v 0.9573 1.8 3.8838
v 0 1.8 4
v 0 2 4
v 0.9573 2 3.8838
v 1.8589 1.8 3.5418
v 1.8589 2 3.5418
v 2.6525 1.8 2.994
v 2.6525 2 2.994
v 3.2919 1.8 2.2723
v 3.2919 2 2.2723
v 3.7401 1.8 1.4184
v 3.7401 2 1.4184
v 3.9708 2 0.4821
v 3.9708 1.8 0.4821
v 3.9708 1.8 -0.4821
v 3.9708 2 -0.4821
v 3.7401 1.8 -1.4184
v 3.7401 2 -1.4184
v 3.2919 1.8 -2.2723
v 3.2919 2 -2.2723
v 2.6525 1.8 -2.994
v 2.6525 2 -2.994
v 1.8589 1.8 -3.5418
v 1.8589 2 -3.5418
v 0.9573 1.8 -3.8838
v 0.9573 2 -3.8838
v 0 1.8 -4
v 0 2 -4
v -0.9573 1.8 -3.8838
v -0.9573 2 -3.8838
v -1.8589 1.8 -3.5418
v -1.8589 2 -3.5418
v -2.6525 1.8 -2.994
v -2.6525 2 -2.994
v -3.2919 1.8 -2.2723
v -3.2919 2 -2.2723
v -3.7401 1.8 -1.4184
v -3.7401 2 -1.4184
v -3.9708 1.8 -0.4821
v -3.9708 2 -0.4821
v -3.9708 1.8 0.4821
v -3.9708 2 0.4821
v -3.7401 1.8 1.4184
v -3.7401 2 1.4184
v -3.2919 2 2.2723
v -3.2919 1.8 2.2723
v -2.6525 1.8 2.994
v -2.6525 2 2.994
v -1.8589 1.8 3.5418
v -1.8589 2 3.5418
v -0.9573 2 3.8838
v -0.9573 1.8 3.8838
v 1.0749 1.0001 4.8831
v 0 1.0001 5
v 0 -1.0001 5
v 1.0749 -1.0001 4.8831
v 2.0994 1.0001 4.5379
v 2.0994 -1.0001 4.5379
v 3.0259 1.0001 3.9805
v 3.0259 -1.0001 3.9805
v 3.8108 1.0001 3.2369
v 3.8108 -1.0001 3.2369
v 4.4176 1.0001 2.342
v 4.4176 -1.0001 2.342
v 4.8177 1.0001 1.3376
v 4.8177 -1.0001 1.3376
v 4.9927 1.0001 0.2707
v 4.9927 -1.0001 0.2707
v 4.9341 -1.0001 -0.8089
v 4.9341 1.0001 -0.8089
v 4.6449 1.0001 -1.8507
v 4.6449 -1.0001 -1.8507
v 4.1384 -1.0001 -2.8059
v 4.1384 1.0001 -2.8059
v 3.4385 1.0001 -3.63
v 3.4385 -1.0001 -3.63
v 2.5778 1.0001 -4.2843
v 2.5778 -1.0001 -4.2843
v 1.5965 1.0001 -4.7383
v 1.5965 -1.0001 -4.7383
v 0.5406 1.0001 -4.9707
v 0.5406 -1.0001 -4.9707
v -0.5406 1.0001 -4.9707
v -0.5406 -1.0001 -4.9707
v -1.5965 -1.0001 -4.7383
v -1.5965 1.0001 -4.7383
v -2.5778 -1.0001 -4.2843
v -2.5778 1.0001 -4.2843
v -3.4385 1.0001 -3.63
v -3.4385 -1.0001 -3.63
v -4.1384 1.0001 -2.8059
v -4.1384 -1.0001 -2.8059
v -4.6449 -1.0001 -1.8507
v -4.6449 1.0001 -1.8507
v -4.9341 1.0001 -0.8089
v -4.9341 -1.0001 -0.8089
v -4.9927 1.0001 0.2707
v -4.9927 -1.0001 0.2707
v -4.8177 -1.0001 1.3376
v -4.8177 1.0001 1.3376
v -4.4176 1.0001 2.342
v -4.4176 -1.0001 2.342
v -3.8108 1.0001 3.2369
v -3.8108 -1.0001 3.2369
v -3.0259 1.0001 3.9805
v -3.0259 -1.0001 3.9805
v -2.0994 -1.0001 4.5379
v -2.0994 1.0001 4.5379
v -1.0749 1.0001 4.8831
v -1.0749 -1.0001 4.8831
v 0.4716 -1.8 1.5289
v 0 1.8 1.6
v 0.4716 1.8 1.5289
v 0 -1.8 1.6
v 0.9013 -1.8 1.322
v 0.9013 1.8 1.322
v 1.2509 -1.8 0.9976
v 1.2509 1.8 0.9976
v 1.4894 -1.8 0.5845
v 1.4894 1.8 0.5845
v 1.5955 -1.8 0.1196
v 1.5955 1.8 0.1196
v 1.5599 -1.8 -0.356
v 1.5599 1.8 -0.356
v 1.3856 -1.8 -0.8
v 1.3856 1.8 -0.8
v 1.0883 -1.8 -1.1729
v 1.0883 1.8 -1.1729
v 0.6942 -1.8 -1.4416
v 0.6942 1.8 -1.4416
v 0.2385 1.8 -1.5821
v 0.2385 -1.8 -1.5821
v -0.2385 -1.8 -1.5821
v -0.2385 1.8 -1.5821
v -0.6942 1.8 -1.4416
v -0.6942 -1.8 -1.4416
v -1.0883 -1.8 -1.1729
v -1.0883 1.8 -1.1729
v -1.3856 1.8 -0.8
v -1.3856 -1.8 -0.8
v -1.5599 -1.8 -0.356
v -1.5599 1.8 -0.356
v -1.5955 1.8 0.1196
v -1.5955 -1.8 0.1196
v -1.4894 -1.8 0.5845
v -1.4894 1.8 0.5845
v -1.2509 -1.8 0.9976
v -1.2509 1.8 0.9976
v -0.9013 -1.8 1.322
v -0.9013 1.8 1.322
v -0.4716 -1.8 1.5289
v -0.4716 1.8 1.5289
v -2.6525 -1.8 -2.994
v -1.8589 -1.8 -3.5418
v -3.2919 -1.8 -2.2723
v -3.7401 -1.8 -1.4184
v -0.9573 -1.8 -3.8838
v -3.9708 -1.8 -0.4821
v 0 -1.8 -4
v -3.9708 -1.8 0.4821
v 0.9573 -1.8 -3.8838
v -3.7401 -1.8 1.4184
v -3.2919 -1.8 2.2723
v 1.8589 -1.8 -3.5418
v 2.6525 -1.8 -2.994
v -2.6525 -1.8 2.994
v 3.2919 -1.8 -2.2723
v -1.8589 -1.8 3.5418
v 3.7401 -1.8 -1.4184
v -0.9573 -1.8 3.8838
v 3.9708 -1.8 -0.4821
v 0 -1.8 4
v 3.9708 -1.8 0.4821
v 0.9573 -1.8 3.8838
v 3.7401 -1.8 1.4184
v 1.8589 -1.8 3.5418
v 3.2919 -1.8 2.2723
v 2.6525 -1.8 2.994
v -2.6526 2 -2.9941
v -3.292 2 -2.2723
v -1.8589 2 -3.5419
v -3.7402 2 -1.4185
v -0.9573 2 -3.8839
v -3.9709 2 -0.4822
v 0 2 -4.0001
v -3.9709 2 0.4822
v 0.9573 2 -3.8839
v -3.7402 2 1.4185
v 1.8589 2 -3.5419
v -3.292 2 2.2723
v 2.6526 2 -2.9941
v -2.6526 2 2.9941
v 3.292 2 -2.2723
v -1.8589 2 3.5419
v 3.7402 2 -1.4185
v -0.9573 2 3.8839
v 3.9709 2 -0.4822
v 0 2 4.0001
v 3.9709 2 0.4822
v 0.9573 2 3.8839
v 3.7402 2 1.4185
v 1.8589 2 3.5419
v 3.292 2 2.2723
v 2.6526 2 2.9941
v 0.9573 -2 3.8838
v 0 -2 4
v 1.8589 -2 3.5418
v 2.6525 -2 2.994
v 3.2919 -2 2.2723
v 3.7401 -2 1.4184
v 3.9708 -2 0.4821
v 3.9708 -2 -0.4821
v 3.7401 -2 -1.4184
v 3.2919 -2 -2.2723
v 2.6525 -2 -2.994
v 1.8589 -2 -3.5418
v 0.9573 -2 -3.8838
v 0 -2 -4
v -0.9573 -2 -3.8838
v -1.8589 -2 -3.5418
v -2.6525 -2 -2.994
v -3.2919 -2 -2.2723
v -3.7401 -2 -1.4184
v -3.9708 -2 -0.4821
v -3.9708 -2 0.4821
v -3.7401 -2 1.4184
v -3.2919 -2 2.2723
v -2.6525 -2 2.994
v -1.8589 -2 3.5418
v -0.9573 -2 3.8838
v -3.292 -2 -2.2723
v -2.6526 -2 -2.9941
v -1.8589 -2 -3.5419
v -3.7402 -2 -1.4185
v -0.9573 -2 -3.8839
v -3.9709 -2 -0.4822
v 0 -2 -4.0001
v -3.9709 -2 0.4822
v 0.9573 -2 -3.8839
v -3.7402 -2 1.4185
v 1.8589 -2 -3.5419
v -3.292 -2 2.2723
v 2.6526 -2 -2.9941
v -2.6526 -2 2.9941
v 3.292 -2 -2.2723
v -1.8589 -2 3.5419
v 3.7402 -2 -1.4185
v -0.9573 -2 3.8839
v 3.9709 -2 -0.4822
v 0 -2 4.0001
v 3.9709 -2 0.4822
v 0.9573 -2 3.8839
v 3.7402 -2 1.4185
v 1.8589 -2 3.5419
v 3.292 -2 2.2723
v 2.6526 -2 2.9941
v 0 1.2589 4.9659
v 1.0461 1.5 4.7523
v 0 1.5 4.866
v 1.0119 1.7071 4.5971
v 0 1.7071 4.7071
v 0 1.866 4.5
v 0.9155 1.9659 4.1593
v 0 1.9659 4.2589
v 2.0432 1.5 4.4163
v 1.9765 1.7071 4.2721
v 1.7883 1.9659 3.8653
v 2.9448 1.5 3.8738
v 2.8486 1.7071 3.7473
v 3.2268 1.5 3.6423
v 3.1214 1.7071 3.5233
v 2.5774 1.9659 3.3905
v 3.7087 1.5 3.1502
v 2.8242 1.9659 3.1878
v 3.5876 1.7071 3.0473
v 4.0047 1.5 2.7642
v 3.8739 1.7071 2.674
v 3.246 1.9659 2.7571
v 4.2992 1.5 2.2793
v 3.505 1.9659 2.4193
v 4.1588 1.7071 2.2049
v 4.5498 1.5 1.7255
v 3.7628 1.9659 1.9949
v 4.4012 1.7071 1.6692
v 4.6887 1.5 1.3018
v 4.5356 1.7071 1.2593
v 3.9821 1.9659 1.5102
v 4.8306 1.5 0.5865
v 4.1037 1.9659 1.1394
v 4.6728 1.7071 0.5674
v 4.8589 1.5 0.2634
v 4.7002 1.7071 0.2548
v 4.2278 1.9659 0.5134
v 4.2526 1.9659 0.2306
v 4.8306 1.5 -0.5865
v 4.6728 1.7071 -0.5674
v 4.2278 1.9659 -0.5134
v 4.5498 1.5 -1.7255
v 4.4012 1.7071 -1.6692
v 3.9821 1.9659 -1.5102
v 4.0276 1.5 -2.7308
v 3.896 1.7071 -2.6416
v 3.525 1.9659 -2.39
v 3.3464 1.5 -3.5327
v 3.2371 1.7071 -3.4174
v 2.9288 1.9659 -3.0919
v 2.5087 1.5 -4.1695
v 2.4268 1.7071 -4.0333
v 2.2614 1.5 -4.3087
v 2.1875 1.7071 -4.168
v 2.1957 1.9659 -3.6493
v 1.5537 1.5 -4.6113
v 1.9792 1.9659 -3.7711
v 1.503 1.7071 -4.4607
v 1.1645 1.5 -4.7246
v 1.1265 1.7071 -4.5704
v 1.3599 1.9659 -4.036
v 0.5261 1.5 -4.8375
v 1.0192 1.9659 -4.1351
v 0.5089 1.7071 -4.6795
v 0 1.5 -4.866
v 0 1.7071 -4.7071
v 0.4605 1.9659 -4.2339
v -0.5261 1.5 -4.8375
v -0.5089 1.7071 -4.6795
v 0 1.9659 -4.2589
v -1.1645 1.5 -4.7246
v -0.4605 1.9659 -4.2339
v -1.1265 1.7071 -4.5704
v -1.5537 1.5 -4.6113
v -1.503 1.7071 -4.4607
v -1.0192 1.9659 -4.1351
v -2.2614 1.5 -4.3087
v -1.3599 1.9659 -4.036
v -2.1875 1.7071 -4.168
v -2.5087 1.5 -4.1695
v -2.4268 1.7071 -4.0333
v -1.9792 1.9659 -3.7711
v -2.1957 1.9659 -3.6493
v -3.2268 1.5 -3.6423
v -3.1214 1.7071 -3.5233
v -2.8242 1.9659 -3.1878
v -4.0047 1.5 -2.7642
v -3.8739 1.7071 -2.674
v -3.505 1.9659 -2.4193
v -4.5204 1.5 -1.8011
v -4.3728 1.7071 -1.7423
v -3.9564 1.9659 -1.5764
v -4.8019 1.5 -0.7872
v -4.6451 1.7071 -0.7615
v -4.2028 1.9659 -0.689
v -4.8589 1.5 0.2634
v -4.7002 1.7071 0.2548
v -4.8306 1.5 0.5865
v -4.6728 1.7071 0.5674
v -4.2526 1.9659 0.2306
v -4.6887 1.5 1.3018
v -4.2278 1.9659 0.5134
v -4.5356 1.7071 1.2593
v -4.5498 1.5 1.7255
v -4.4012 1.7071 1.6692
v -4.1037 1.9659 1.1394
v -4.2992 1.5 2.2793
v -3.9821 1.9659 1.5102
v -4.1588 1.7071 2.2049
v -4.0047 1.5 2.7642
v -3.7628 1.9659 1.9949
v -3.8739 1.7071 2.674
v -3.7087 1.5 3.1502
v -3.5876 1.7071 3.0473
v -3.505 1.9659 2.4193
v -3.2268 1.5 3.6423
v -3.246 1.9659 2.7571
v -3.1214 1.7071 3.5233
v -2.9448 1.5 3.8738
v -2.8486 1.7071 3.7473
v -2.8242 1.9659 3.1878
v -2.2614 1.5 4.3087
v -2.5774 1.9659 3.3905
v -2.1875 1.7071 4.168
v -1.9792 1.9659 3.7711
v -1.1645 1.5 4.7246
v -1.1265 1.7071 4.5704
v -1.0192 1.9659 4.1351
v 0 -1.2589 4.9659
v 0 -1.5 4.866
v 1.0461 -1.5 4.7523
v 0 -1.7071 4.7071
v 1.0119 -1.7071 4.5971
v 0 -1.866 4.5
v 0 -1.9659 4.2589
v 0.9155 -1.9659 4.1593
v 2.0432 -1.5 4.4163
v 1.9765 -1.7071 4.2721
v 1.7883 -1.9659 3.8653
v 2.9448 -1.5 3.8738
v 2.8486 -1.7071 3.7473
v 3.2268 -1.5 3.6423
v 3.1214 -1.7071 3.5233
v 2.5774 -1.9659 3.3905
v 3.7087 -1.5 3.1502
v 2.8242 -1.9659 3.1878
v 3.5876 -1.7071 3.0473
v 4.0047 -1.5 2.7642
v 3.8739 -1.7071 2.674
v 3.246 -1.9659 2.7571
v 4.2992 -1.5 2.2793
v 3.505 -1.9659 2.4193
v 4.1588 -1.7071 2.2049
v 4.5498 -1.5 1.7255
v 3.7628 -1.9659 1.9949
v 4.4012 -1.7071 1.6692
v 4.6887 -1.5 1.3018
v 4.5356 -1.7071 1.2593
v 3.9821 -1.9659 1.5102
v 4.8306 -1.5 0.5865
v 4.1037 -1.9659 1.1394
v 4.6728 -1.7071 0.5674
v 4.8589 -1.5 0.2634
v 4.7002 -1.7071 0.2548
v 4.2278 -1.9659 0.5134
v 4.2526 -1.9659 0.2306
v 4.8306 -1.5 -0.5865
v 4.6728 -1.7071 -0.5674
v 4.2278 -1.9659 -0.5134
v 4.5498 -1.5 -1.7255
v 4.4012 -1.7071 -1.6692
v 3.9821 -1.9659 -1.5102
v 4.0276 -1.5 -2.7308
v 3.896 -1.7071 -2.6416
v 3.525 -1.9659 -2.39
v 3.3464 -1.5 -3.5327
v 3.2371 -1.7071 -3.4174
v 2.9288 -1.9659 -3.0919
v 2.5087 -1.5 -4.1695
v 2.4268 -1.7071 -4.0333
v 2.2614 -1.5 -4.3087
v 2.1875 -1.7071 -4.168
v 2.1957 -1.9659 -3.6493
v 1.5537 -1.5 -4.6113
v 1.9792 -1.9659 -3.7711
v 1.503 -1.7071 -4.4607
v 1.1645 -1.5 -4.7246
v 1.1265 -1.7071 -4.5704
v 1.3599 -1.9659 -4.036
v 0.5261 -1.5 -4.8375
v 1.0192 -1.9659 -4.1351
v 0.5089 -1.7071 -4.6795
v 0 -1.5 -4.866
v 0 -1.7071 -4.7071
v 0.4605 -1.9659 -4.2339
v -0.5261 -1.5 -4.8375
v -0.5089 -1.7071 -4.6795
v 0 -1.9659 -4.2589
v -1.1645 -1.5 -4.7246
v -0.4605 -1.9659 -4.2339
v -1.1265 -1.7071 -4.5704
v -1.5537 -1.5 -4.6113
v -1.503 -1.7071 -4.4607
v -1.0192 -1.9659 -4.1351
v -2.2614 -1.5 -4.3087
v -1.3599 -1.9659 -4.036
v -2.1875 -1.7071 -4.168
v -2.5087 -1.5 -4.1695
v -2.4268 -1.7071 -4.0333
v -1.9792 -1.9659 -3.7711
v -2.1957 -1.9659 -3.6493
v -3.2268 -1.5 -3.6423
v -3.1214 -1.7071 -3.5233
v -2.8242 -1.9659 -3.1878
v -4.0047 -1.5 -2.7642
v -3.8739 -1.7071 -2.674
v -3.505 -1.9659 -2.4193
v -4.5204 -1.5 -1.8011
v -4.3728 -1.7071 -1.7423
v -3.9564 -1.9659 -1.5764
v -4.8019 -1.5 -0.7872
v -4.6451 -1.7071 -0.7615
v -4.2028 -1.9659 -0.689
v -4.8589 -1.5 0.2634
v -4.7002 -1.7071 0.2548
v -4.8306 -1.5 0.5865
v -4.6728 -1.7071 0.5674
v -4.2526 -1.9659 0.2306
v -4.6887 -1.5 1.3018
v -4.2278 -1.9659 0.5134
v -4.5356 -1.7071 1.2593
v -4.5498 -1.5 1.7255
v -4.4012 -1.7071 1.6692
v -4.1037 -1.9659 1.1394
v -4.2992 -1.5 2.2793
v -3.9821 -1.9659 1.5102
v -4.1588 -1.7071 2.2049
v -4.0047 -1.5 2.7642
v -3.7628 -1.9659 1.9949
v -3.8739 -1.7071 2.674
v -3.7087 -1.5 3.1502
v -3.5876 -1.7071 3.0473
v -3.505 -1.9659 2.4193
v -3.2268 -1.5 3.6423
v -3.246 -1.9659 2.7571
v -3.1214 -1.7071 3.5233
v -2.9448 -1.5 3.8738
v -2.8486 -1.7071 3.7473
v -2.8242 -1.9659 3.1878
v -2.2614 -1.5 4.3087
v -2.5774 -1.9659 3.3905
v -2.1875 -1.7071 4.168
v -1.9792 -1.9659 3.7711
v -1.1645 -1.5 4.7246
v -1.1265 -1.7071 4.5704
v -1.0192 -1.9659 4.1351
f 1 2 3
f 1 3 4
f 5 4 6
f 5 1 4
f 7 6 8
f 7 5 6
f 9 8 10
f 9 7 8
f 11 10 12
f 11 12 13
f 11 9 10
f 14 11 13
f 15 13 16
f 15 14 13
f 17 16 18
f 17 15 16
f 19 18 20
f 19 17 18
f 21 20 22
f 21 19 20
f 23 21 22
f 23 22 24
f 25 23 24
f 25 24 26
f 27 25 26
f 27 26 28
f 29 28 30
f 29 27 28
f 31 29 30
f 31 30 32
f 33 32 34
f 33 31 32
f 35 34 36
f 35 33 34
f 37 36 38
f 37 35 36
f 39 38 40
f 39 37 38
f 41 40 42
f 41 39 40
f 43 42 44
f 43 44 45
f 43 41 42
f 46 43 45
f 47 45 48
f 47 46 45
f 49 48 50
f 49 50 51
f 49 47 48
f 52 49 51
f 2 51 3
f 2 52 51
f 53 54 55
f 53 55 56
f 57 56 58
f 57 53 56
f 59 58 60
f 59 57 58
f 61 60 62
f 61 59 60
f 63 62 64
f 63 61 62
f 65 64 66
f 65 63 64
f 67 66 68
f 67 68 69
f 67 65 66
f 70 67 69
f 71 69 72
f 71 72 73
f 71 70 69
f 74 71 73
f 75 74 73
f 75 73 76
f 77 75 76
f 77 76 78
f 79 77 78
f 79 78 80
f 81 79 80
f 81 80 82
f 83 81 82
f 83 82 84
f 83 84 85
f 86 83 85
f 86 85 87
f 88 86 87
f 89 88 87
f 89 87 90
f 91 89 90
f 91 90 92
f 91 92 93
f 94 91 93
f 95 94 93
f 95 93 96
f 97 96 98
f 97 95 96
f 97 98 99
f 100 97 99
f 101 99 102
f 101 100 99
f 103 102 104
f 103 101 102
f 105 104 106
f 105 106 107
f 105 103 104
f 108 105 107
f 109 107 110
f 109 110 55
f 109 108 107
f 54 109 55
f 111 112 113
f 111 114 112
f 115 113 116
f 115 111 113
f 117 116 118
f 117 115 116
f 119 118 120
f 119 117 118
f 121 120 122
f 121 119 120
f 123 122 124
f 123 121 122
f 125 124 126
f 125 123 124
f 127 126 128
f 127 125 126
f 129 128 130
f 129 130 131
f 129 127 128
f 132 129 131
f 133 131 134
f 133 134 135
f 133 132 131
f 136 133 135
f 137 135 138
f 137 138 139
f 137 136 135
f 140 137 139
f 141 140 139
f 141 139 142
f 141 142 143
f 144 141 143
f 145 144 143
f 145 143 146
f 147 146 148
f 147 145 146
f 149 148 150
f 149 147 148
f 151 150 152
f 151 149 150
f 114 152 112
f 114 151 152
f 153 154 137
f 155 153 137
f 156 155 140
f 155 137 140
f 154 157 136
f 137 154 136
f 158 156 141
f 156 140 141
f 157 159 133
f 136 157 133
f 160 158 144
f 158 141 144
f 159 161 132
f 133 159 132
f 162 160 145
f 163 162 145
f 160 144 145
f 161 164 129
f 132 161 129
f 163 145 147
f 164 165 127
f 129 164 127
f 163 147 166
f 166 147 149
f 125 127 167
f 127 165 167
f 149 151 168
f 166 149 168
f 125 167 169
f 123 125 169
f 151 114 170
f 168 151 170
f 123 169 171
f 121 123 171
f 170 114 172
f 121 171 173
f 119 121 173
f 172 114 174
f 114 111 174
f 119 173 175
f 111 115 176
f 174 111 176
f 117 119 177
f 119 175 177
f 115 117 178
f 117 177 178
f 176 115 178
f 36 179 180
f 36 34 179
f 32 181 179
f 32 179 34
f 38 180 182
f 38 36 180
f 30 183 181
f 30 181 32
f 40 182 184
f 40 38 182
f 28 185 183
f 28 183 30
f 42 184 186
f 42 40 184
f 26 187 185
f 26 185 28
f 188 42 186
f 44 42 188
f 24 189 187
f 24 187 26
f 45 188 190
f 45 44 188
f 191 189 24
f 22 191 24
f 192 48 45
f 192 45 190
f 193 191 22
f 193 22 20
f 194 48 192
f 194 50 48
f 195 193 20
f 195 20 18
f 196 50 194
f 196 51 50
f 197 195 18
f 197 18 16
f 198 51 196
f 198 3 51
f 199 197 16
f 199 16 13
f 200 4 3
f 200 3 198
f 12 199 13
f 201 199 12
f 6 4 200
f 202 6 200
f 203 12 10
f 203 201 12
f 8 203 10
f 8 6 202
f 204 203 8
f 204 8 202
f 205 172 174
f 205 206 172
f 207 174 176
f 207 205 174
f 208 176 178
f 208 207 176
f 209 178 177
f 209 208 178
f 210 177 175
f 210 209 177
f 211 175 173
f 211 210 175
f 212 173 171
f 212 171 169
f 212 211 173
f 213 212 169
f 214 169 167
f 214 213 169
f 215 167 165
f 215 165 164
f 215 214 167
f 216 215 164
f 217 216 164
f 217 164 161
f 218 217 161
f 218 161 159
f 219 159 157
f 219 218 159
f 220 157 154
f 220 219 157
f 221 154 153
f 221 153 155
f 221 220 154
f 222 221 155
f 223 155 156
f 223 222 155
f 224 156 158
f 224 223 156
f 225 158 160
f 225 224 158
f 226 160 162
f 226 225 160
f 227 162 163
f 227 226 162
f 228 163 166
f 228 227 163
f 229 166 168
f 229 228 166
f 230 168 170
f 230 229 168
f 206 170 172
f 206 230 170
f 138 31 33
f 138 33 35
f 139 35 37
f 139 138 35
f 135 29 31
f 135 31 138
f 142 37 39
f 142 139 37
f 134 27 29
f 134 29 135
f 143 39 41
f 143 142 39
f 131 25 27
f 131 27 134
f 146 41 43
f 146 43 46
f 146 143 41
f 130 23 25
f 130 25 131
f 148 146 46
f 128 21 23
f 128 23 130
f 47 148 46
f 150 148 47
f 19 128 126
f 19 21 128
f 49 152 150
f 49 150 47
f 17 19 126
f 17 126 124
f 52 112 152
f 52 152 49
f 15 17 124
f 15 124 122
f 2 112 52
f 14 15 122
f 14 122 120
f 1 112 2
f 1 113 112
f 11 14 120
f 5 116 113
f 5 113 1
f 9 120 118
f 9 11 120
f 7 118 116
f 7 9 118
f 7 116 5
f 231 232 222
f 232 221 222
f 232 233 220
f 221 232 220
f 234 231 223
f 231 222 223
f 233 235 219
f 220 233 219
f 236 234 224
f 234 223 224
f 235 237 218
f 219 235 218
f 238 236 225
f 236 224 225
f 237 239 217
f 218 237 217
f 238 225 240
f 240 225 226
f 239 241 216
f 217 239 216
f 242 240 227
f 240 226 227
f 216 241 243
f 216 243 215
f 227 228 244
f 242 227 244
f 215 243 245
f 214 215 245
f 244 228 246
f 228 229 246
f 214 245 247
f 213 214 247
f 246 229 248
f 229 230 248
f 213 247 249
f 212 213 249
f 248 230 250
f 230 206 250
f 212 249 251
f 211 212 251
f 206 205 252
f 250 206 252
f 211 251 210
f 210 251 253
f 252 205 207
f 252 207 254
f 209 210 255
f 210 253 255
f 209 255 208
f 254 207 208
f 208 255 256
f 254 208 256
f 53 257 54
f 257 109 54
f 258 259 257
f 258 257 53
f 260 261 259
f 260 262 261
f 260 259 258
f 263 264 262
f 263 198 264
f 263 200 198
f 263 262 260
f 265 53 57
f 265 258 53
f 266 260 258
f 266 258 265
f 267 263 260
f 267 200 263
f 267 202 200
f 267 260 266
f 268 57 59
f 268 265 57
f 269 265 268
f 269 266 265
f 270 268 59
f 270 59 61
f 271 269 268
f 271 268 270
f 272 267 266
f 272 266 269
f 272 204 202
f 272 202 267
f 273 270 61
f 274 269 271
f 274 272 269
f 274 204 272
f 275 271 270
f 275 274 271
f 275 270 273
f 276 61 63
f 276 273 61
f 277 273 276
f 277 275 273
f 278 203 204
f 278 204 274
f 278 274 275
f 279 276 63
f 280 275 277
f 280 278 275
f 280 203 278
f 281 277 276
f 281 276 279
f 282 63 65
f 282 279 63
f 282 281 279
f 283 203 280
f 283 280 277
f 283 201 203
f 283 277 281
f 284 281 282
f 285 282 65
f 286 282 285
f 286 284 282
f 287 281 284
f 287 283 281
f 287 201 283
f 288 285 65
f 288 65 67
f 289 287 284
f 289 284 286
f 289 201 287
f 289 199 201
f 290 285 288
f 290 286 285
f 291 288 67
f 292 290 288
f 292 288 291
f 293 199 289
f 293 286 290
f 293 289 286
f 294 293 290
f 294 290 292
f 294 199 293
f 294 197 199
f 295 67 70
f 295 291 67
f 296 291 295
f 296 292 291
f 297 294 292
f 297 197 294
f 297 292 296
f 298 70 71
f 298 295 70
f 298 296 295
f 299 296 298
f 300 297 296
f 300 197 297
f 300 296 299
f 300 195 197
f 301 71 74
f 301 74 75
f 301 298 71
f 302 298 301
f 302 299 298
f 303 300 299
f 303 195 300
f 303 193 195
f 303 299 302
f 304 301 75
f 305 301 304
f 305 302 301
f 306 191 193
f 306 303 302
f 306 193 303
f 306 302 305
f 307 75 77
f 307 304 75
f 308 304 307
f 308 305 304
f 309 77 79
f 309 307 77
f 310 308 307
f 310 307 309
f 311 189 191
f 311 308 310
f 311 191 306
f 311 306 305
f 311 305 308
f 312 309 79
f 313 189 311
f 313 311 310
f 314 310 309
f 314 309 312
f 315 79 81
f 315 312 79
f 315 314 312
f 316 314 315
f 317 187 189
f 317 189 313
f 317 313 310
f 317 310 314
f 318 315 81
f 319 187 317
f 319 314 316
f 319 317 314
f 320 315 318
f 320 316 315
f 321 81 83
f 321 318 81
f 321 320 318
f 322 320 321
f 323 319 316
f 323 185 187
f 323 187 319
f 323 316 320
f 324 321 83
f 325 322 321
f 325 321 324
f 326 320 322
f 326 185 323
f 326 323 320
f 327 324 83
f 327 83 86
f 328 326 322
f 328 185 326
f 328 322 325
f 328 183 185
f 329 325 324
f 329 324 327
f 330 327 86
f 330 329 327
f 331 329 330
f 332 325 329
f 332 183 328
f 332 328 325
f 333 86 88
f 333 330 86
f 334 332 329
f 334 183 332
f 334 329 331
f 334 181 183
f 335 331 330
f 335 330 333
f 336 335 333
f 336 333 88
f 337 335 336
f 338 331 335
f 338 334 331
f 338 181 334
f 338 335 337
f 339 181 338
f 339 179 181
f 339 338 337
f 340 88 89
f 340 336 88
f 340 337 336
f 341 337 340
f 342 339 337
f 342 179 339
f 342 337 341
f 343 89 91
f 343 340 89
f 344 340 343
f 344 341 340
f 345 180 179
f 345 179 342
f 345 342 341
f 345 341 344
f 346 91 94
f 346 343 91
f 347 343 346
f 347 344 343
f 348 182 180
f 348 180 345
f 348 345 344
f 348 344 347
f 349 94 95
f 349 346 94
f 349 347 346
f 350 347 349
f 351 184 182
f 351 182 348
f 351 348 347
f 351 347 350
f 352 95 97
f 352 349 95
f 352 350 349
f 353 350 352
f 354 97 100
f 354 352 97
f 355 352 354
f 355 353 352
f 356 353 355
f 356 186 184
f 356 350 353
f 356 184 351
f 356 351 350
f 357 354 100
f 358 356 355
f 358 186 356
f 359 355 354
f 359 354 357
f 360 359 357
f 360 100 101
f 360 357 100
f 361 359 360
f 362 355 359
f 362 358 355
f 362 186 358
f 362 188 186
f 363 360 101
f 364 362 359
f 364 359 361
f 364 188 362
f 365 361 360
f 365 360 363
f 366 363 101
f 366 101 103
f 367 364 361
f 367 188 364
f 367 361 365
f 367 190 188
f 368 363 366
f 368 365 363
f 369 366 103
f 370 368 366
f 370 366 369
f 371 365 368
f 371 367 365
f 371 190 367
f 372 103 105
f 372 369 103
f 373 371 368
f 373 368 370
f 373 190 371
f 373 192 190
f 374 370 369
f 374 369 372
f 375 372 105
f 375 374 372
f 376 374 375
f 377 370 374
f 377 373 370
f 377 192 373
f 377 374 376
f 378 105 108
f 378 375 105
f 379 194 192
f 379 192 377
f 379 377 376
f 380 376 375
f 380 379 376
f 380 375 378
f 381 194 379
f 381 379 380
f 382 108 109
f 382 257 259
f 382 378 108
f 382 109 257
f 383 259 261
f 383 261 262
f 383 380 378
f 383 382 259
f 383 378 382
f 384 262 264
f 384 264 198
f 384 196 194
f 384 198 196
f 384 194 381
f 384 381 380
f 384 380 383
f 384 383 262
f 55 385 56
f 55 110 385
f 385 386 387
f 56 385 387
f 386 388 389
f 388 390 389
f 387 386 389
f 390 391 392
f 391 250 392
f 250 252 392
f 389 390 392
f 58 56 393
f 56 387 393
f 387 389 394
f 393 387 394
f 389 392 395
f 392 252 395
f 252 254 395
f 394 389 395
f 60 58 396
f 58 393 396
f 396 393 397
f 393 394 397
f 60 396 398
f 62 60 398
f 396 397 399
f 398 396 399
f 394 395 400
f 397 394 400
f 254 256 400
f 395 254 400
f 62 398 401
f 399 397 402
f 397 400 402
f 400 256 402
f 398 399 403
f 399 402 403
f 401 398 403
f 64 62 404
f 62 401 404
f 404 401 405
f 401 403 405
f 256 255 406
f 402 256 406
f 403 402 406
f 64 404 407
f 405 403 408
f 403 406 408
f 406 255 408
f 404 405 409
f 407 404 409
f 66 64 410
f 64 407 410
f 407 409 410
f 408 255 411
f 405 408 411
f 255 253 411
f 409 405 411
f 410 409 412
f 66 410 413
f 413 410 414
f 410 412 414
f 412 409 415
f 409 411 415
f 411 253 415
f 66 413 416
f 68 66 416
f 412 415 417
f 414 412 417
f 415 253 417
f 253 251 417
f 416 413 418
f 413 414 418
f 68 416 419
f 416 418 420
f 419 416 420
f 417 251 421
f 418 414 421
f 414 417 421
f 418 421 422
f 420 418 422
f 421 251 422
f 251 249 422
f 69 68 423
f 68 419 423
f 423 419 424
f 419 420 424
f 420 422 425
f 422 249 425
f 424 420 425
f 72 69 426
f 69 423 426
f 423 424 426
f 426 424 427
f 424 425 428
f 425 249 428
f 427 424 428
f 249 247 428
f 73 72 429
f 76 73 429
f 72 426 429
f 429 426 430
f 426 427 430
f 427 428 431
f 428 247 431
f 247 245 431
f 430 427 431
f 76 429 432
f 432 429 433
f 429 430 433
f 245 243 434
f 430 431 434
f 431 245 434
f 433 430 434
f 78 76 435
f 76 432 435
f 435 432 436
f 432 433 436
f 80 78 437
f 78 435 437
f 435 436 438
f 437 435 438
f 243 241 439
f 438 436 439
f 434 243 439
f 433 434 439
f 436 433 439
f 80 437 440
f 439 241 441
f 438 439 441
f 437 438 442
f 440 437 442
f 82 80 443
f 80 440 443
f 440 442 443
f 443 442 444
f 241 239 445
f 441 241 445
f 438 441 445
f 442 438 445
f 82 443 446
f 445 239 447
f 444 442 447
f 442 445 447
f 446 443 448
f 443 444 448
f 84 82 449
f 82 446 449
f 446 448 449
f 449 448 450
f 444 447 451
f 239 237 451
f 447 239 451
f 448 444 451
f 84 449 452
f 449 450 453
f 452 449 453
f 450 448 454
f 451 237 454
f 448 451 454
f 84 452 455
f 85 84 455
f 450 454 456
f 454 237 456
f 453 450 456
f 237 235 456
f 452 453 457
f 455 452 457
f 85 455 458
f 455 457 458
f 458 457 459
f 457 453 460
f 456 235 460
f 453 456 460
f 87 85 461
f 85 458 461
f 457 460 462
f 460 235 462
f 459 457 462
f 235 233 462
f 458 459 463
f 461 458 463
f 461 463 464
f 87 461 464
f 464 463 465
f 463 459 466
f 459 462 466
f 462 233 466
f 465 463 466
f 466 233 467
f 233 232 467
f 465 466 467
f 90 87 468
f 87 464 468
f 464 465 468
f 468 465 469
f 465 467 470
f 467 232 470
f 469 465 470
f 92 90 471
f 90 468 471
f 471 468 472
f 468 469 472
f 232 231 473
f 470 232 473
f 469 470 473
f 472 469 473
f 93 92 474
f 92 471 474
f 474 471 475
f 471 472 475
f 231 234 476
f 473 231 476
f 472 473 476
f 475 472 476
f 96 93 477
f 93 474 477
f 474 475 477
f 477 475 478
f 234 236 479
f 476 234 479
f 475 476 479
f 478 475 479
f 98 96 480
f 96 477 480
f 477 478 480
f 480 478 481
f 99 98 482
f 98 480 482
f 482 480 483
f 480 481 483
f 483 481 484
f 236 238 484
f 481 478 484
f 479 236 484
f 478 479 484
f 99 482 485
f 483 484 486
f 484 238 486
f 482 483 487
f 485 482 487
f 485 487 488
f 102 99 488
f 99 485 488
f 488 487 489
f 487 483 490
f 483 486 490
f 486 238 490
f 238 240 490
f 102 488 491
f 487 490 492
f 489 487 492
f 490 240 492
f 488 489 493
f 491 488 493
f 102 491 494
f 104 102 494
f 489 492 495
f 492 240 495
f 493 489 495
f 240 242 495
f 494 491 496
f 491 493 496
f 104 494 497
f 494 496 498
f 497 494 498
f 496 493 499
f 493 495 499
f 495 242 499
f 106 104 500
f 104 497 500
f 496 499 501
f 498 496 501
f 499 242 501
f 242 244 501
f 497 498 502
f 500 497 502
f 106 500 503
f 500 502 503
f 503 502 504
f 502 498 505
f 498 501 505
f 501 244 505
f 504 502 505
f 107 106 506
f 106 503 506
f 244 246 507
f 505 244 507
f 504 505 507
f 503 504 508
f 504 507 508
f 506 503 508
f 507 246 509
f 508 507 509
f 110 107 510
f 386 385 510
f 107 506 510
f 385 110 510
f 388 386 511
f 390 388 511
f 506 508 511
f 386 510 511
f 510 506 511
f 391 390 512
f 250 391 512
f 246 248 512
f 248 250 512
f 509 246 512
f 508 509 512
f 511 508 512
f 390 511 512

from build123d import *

# Parameters (mm, degrees)
SKETCH_1_R      = 4
SKETCH_1_R_2    = 1.6
EXTRUDE_1_DEPTH = 1.8
SKETCH_2_R      = 5
SKETCH_2_R_2    = 4
EXTRUDE_2_DEPTH = 2
FILLET_1_R      = 1


with BuildPart() as part:
    # 草图1 → 凸台-拉伸1 (new, symmetric)
    with BuildSketch(Plane(origin=(0, 0, 0), x_dir=(1, 0, 0), z_dir=(0, 1, 0))):
        with Locations(Location((0, 0, 0), (0, 0, 270))):
            Circle(SKETCH_1_R)
        with Locations(Location((0, 0, 0), (0, 0, 270))):
            Circle(SKETCH_1_R_2, mode=Mode.SUBTRACT)
    extrude(amount=EXTRUDE_1_DEPTH, both=True)

    # 草图2 → 凸台-拉伸2 (add, symmetric)
    with BuildSketch(Plane(origin=(0, 0, 0), x_dir=(1, 0, 0), z_dir=(0, 1, 0))):
        with Locations(Location((0, 0, 0), (0, 0, 270))):
            Circle(SKETCH_2_R)
        with Locations(Location((0, 0, 0), (0, 0, 270))):
            Circle(SKETCH_2_R_2, mode=Mode.SUBTRACT)
    extrude(amount=EXTRUDE_2_DEPTH, both=True)

    # 圆角1
    fillet_1_edges = [part.edges().sort_by_distance(p)[0] for p in [
        (0, -2, -5),
        (0, 2, -5),
    ]]
    fillet(fillet_1_edges, radius=FILLET_1_R - 0.0001)  # a hair under: the kernel refuses the full size


solid = part.part
